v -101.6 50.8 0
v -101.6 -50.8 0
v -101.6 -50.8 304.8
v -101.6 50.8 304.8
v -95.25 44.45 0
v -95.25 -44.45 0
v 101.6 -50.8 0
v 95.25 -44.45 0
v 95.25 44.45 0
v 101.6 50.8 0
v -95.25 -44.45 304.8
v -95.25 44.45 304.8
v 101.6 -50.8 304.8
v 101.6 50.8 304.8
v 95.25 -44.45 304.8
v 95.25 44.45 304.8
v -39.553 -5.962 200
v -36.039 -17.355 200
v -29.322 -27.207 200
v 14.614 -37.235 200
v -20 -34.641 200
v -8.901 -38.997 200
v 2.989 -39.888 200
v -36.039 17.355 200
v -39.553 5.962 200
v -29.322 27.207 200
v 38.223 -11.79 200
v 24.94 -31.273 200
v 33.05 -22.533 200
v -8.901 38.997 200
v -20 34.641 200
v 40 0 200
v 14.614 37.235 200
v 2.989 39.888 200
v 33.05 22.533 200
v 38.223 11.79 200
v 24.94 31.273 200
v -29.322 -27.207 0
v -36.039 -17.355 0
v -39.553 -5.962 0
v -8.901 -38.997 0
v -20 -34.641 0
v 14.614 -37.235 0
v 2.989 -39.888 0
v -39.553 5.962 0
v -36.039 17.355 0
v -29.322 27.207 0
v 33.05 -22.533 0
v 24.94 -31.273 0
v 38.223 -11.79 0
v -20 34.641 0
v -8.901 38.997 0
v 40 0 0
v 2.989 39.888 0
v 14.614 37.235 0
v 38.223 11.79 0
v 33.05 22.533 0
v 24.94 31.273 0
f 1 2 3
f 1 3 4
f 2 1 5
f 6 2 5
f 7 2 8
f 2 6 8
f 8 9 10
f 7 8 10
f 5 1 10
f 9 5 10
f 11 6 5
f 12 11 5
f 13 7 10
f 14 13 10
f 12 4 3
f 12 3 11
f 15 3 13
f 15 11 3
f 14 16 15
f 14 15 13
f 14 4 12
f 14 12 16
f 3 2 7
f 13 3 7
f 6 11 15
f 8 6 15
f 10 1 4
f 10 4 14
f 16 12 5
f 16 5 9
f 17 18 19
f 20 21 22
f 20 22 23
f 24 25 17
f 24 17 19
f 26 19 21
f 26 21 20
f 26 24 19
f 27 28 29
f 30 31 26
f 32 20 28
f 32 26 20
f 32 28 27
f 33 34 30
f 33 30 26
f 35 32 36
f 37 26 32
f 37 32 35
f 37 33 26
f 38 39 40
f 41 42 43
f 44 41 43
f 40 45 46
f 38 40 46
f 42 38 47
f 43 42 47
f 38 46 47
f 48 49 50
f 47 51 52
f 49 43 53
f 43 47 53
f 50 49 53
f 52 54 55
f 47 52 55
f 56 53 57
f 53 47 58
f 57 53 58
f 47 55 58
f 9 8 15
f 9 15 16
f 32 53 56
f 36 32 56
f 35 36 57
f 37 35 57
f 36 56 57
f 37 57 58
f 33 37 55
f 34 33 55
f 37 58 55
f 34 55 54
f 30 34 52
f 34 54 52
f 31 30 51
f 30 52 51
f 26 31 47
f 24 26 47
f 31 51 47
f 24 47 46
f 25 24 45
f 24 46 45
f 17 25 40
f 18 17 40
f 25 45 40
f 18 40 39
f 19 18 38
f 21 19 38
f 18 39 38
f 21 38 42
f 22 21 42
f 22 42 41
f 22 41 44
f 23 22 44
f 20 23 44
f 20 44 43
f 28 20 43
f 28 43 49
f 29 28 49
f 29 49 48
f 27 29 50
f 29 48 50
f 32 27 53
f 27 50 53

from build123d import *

# Parameters (mm, degrees)
F0_W     = 203.2
F0_H     = 101.6
F0_W_2   = 190.5
F0_H_2   = 88.9
F1_DEPTH = 304.8
F0_R     = 40
F2_DEPTH = 200


with BuildPart() as f1:
    # F0 (on Top) → F1 (new body)
    with BuildSketch(Plane.XY):
        Rectangle(F0_W, F0_H)
        Rectangle(F0_W_2, F0_H_2, mode=Mode.SUBTRACT)
    extrude(amount=F1_DEPTH)


with BuildPart() as f2:
    # F0 (on Top) → F2 (new body)
    with BuildSketch(Plane.XY):
        Circle(F0_R)
    extrude(amount=F2_DEPTH)


solid = Compound([f1.part, f2.part])
